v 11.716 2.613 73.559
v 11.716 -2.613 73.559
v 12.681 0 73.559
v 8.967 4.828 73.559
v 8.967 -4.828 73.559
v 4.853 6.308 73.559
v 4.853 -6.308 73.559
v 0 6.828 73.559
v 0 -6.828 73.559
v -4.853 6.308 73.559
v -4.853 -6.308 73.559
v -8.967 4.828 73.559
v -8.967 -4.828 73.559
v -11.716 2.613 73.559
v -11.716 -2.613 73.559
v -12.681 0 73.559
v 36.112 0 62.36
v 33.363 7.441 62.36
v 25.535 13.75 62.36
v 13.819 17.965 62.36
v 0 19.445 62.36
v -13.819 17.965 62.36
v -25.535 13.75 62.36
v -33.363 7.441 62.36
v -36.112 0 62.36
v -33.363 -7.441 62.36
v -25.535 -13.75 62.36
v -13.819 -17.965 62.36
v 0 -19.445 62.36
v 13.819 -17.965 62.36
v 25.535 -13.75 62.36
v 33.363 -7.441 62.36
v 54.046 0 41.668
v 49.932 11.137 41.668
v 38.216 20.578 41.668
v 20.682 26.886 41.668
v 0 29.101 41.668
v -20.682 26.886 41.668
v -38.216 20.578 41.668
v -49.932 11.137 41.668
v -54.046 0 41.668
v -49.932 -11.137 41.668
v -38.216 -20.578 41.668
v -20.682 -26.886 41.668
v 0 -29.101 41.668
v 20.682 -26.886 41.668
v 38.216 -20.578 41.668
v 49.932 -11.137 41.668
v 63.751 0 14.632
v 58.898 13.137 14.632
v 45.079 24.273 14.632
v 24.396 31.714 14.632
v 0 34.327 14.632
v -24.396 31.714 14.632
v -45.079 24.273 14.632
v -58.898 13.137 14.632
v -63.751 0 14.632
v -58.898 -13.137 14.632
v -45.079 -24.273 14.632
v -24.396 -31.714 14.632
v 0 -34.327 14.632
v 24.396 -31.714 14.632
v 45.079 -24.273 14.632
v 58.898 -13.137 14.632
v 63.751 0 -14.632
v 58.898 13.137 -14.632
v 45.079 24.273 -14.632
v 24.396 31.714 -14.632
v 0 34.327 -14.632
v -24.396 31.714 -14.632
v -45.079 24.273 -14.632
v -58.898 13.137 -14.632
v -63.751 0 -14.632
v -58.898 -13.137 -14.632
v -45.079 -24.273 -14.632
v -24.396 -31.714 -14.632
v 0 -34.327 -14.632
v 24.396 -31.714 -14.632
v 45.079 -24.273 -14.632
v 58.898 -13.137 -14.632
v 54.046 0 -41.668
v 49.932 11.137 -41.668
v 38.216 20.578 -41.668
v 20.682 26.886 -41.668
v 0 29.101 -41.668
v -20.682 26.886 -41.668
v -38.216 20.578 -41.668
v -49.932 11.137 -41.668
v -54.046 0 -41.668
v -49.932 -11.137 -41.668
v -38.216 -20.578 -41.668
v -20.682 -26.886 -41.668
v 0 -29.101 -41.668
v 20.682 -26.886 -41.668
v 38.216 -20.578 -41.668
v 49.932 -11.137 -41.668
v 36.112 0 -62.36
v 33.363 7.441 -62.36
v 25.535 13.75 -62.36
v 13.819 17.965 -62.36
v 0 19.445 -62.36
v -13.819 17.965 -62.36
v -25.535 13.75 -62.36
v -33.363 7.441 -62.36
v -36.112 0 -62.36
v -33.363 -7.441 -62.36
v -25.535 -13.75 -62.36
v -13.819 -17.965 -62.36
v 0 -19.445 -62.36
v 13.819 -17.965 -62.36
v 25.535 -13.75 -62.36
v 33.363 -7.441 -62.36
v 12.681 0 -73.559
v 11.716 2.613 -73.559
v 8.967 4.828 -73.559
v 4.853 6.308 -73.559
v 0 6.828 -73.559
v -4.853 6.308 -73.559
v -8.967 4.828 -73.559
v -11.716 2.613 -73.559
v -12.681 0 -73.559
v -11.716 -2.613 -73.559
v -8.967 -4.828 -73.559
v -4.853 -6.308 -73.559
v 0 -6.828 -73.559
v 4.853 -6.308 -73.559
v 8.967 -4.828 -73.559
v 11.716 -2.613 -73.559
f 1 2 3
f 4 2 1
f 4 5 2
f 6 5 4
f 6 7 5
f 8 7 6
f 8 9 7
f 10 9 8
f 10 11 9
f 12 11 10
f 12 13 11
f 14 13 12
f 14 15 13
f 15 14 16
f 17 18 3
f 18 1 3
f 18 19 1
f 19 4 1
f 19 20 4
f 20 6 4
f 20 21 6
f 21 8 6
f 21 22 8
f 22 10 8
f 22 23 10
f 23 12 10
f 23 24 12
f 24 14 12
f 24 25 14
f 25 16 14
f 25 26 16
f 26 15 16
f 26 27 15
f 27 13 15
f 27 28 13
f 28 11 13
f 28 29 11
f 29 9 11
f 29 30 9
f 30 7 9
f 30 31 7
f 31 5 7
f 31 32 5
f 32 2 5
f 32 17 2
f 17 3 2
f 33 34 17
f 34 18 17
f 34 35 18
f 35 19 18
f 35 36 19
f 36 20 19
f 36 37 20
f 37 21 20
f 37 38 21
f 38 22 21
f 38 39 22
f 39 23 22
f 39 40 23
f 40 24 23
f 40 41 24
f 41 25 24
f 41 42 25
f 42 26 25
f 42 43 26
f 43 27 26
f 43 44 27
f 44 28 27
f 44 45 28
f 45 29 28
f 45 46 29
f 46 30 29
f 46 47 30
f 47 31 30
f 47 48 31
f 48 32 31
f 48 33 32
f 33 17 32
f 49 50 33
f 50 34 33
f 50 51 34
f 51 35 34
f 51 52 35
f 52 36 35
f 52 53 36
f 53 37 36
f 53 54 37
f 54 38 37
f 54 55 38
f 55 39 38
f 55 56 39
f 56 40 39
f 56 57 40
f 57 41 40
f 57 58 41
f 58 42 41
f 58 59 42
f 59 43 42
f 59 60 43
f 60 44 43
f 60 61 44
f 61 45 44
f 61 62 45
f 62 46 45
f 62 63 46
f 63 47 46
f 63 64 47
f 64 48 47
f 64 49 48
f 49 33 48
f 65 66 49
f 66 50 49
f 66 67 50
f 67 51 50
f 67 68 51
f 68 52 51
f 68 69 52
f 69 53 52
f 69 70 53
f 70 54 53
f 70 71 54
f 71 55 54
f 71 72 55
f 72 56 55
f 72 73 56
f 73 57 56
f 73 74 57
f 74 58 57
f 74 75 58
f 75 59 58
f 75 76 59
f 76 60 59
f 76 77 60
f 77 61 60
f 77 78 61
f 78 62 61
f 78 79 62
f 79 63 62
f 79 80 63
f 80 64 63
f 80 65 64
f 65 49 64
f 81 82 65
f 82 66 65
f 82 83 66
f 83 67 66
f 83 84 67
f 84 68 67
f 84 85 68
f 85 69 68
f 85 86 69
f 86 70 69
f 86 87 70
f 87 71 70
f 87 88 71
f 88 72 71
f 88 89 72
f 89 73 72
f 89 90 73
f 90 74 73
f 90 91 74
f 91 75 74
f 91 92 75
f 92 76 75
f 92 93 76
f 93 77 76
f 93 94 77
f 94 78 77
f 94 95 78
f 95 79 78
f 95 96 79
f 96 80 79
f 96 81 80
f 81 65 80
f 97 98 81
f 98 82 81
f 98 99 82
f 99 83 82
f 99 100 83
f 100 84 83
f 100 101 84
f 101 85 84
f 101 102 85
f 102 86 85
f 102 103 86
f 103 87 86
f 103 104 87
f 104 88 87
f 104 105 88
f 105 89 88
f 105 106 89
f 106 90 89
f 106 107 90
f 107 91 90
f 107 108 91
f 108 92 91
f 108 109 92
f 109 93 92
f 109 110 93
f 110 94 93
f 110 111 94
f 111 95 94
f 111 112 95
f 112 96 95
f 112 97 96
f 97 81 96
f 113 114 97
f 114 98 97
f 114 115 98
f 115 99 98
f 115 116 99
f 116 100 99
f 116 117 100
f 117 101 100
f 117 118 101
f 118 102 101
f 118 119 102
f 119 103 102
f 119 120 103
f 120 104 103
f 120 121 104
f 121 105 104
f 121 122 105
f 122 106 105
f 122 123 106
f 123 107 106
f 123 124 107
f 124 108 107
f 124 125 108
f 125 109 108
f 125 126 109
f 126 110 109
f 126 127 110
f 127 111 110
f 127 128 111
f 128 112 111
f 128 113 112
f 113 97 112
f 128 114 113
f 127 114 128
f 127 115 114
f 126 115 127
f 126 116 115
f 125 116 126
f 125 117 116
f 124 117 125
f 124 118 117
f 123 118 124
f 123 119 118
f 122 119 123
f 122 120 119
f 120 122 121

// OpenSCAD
// Generated by SolidPython 1.0.1 on 2020-07-29 00:46:50


scale(v = [13, 7, 15]) {
	sphere(r = 5);
}
/***********************************************
*********      SolidPython code:      **********
************************************************
 
# import packages: SolidPython
from solid import *
from solid.utils import *
from itertools import chain, combinations, permutations


class Resize:

    def __init__(self, scad_file):
        self.scad_file = scad_file
        #self.scad_file = import_scad(scad_file)
        # cone/cylinder param:
        self.r1 = 0
        self.r2 = 0
        self.h = 0
        # rectangular prism param:
        self.w = 0
        self.l = 0
        # ellipse param:
        self.r = 0

    # import OpenScad code (file name corresponds to shape)


    # classify shape + parameters
    def assign(self, param1, param2, param3):
        if self.scad_file == 'cone.scad':
            self.r1 = param1
            self.r2 = param2
            self.h = param3
        elif self.scad_file == 'cylinder.scad':
            self.r1 = param1
            self.r2 = param2
            self.h = param3
        elif self.scad_file == 'rectangularPrism.scad':
            self.h = param1
            self.l = param2
            self.w = param3
        else:
            self.r = param1
            self.h = param2

    # resize parameters
    def iterate(self):
        x = range(3, 20, 2)
        i = 1
        if self.scad_file == 'cone.scad':
            tempList = list(permutations(x, 2))
            for temp in tempList:
                param1 = temp[0]
                param2 = temp[1]
                filepath = 'produced_scad_files/' + 'cone' + str(param1) + '_' + str(param2) + '_' + '.scad'
                scad_render_to_file(cylinder(h=param1, r1=param2, r2=0), filepath)

        elif self.scad_file == 'cylinder.scad':
            tempList = list(permutations(x, 3))
            for temp in tempList:
                param1 = temp[0]
                param2 = temp[1]
                filepath = 'produced_scad_files/' + 'cylinder' + str(param1) + '_' + str(param2) + '_' + '.scad'
                scad_render_to_file(cylinder(h=param1, r1=param2, r2=param2), filepath)

        elif self.scad_file == 'rectangularPrism.scad':
            tempList = list(permutations(x, 3))
            for temp in tempList:
                param1 = temp[0]
                param2 = temp[1]
                param3 = temp[2]
                filepath = 'produced_scad_files/' + 'rectangularPrism' + str(param1) + '_' + str(param2) + '_' + str(
                    param3) + '.scad'
                scad_render_to_file(cube(size=(param1, param2, param3)), filepath)

        elif self.scad_file == 'ellipse.scad':
            tempList = list(permutations(x, 4))
            for temp in tempList:
                param1 = temp[0]
                param2 = temp[1]
                param3 = temp[2]
                param4 = temp[3]
                filepath = 'produced_scad_files/' + 'ellipse' + str(param1) + '_' + str(param2) + '_' + str(param3) + '_' + str(param4) + '.scad'
                scad_render_to_file(scale([param1, param2, param3])(sphere(r=param4)), filepath)

    def render_to_scadfile(self):
        scad_render_to_file(scad, 'example.scad') 
 
************************************************/
